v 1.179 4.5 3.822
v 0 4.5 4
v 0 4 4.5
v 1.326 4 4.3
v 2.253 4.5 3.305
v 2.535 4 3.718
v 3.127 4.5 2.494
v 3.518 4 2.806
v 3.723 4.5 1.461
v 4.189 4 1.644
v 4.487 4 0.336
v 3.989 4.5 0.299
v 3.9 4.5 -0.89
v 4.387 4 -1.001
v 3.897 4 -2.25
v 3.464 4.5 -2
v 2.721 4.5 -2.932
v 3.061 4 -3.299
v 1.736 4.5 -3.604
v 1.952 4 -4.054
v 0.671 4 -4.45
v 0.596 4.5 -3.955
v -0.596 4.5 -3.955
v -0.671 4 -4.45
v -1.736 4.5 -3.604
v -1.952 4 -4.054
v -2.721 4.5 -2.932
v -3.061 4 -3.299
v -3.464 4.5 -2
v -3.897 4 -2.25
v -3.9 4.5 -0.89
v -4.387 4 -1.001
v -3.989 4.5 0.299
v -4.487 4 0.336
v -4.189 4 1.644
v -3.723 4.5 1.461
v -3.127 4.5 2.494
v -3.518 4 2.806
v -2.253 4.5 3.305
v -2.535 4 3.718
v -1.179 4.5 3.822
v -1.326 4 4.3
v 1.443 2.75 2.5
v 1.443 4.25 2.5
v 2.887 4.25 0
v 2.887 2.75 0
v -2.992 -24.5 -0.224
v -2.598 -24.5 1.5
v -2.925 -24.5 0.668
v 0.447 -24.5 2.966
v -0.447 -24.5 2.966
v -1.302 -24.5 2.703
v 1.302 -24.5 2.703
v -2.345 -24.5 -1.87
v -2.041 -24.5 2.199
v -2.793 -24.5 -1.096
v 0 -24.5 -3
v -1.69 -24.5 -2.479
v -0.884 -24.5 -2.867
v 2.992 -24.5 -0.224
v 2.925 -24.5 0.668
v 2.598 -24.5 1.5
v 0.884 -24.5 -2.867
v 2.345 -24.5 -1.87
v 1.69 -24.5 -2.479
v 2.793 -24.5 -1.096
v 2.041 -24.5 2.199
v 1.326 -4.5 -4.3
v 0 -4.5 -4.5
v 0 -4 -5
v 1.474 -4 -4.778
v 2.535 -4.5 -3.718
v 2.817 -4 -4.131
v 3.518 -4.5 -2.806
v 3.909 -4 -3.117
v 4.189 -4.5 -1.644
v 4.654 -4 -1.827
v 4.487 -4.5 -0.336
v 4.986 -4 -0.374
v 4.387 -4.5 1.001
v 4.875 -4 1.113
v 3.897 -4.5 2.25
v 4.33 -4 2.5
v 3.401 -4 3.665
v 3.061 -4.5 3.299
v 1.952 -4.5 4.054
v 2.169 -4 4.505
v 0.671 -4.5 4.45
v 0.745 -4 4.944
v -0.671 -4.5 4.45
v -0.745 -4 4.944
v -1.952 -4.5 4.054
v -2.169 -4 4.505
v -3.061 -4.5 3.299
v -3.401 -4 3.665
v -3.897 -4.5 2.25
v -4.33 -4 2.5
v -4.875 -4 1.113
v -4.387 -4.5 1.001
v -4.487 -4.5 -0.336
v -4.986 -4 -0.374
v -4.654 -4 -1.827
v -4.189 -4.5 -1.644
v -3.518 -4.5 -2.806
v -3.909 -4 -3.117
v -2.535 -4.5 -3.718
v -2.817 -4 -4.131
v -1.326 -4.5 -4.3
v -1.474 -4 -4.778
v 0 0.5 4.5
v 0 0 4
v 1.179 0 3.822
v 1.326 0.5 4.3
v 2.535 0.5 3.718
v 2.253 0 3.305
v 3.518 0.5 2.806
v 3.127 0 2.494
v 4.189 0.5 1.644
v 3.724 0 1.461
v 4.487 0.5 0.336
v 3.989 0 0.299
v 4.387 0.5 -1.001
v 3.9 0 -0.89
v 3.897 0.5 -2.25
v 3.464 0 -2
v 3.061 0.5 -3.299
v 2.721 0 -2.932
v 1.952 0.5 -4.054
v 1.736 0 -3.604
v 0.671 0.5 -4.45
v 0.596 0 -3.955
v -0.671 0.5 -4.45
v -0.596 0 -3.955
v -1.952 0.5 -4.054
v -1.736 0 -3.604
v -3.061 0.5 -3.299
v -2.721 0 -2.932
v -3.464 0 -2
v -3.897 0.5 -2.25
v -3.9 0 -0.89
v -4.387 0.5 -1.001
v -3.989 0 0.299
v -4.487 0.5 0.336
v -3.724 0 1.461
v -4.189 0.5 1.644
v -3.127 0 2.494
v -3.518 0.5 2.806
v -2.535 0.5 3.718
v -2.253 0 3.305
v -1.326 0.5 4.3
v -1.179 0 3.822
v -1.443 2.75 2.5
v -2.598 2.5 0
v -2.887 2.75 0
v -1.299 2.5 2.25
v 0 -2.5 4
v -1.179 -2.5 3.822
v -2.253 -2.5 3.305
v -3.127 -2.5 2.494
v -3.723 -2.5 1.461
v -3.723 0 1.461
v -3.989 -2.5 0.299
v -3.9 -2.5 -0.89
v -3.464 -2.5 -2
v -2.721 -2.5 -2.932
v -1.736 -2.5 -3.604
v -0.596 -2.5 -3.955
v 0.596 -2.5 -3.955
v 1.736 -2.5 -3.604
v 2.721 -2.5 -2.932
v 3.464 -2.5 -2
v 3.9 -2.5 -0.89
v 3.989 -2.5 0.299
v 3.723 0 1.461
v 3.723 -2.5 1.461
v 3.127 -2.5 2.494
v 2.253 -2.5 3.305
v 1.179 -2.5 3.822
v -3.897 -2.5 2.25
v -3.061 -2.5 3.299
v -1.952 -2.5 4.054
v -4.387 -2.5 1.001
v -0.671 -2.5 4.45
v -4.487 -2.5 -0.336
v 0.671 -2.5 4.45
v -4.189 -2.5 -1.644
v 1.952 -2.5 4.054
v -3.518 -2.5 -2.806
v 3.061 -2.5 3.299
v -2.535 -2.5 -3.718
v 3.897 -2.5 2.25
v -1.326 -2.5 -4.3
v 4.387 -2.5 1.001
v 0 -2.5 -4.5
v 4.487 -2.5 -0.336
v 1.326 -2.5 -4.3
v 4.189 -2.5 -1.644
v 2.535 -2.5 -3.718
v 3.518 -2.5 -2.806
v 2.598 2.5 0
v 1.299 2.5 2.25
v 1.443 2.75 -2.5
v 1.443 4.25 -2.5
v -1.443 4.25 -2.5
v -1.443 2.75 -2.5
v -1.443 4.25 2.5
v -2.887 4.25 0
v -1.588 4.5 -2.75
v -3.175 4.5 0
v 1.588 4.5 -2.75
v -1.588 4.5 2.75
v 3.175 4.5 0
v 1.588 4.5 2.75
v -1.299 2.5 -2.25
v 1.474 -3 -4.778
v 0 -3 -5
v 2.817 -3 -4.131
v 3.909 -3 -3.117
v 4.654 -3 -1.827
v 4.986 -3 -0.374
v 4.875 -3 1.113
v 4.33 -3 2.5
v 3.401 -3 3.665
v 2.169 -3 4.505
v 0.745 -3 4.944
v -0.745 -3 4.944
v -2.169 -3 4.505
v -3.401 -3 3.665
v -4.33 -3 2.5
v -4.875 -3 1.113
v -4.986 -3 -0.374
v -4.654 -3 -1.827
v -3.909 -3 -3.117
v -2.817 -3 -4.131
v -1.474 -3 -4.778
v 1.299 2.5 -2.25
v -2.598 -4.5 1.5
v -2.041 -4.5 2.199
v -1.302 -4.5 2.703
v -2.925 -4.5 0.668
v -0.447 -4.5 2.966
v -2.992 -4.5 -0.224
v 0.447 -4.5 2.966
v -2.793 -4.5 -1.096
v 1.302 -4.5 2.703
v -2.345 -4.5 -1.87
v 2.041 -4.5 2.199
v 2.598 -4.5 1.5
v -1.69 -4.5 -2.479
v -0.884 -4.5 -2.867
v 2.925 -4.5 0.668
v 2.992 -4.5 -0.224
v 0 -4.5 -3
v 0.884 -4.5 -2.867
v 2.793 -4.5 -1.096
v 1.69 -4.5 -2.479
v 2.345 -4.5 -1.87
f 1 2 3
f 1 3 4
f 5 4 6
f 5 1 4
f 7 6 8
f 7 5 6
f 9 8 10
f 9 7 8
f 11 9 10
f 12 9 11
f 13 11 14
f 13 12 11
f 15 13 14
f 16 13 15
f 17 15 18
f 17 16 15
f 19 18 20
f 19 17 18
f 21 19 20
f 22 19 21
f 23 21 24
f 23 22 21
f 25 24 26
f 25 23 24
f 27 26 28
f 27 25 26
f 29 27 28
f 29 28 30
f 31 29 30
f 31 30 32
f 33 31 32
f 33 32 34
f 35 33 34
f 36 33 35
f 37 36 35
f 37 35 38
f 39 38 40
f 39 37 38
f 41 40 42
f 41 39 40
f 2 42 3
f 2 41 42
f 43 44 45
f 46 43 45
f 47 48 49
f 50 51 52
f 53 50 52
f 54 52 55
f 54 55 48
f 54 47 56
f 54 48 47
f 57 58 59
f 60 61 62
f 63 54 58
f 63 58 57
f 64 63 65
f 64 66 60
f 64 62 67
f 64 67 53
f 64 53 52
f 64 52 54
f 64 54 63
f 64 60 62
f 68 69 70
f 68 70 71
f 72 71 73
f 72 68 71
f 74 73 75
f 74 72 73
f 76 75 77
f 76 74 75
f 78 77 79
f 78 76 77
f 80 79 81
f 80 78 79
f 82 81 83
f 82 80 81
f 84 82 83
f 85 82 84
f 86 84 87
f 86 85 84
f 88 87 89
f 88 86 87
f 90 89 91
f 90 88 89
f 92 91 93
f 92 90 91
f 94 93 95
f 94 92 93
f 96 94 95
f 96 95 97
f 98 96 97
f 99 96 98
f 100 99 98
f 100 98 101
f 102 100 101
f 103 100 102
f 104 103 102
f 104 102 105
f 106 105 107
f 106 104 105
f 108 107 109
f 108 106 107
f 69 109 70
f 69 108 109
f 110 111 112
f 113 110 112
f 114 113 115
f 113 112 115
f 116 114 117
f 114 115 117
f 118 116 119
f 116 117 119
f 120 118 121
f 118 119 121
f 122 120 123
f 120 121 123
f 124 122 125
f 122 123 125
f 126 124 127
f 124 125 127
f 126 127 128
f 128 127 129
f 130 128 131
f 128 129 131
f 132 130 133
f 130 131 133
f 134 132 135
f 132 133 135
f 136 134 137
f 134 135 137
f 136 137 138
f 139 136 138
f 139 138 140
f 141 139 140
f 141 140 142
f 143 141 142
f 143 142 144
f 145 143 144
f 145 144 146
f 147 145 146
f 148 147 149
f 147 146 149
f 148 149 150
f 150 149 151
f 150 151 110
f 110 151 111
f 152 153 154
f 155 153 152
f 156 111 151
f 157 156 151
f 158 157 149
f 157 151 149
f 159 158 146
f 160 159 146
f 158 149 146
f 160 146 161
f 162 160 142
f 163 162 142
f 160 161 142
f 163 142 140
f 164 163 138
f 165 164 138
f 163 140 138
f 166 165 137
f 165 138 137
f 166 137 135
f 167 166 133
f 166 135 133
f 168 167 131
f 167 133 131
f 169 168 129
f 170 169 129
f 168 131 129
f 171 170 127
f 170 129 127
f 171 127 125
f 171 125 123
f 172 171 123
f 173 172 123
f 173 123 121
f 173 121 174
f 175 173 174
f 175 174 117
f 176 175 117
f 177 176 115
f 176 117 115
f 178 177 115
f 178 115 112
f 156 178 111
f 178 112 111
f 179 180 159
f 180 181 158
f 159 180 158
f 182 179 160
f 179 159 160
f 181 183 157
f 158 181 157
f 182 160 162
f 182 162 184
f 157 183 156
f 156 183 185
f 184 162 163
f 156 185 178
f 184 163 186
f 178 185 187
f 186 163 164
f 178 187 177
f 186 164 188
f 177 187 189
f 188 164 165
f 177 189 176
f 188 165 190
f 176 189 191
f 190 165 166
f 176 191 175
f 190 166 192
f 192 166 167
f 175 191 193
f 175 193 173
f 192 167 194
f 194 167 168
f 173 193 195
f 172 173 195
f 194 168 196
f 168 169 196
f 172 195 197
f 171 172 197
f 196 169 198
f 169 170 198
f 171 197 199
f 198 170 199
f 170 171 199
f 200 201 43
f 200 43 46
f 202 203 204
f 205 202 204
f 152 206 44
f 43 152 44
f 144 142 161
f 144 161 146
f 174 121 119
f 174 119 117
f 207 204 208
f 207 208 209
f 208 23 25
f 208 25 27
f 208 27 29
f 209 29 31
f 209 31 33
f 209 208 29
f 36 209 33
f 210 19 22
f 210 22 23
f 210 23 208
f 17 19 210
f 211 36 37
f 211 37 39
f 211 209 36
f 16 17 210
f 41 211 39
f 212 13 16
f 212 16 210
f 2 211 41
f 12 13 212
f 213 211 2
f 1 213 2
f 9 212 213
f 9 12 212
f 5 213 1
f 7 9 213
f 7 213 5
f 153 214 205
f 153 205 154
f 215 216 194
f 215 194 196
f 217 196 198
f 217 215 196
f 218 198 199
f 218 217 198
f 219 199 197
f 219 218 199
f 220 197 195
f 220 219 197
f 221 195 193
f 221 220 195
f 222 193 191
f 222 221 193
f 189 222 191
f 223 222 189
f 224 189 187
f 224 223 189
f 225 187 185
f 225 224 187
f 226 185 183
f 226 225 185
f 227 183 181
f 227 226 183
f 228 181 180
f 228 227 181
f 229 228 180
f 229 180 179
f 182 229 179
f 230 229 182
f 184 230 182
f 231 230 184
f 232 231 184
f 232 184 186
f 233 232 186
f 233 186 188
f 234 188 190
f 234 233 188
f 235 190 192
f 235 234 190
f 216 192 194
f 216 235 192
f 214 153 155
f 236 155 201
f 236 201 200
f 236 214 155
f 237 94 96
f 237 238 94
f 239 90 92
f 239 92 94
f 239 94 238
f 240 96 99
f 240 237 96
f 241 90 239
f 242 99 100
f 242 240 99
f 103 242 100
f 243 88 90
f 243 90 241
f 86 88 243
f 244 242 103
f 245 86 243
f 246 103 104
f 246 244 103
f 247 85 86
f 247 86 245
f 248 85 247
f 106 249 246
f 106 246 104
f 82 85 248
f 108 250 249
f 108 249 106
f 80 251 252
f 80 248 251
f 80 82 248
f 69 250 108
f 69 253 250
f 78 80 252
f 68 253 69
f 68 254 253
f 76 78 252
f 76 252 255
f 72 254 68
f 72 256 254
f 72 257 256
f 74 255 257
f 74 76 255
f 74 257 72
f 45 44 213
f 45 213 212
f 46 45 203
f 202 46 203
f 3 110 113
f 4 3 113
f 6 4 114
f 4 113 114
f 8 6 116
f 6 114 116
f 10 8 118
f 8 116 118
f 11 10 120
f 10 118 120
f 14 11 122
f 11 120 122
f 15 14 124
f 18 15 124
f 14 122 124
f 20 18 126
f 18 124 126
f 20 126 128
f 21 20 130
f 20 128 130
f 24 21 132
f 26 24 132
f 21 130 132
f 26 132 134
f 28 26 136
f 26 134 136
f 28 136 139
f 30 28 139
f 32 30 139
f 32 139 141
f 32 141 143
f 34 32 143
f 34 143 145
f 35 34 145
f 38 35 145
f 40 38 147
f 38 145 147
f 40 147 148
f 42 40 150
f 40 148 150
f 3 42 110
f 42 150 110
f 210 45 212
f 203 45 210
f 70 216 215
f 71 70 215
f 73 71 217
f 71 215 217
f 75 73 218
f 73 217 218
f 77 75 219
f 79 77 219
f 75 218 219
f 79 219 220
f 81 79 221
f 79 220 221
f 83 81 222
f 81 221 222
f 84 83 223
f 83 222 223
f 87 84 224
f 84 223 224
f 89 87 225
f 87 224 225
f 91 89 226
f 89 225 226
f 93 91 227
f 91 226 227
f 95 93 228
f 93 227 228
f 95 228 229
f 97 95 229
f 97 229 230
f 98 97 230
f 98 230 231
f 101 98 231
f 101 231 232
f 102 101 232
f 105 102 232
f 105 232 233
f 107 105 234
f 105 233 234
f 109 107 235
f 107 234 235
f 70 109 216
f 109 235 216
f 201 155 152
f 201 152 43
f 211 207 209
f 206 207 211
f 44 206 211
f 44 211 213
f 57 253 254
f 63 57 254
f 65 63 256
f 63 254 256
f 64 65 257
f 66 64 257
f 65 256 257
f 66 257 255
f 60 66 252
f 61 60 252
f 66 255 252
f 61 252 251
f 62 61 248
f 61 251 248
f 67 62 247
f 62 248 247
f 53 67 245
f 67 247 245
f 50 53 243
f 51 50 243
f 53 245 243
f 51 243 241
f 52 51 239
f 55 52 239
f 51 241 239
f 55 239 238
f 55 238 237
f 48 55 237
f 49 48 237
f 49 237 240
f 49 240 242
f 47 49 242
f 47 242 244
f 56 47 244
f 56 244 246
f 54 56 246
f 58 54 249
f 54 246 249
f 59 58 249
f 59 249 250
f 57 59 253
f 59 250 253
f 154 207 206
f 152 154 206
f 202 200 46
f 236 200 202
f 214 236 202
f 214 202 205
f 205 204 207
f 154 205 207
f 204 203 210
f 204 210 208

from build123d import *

# Parameters (mm, degrees)
SKETCH_1_R          = 4.5
EXTRUDE_1_DEPTH     = 4.5
CUT_EXTRUDE_1_DEPTH = 2
SKETCH_3_R          = 4
EXTRUDE_2_DEPTH     = 2.5
SKETCH_4_R          = 5
EXTRUDE_3_DEPTH     = 2
SKETCH_5_R          = 3
EXTRUDE_4_DEPTH     = 20
CHAMFER_1_SIZE      = 0.5
CHAMFER_2_SIZE      = 0.5
CHAMFER_3_SIZE      = 0.5
CHAMFER_4_SIZE      = 0.25


with BuildPart() as part:
    # ｽｹｯﾁ1 → ﾎﾞｽ - 押し出し1 (new body)
    with BuildSketch(Plane(origin=(0, 0, 0), x_dir=(1, 0, 0), z_dir=(0, 1, 0))):
        with Locations(Location((0, 0, 0), (0, 0, 270))):
            Circle(SKETCH_1_R)
    extrude(amount=EXTRUDE_1_DEPTH)

    # ｽｹｯﾁ2 → ｶｯﾄ - 押し出し1 (cut)
    with BuildSketch(Plane(origin=(0, 4.5, 0), x_dir=(1, 0, 0), z_dir=(0, 1, 0))):
        Polygon((2.886751346, 0), (1.443375673, 2.5), (-1.443375673, 2.5), (-2.886751346, 0), (-1.443375673, -2.5), (1.443375673, -2.5), align=None)
    extrude(amount=-CUT_EXTRUDE_1_DEPTH, mode=Mode.SUBTRACT)

    # ｽｹｯﾁ3 → ﾎﾞｽ - 押し出し2 (add)
    with BuildSketch(Plane.XZ):
        with Locations(Location((0, 0, 0), (0, 0, 90))):
            Circle(SKETCH_3_R)
    extrude(amount=EXTRUDE_2_DEPTH)

    # ｽｹｯﾁ4 → ﾎﾞｽ - 押し出し3 (add)
    with BuildSketch(Plane.XZ.offset(2.5)):
        with Locations(Location((0, 0, 0), (0, 0, 270))):
            Circle(SKETCH_4_R)
    extrude(amount=EXTRUDE_3_DEPTH)

    # ｽｹｯﾁ5 → ﾎﾞｽ - 押し出し4 (add)
    with BuildSketch(Plane.XZ.offset(4.5)):
        with Locations(Location((0, 0, 0), (0, 0, 270))):
            Circle(SKETCH_5_R)
    extrude(amount=EXTRUDE_4_DEPTH)

    # 面取り1
    chamfer_1_edges = [part.edges().sort_by_distance(p)[0] for p in [
        (0, 4.5, -4.5),
    ]]
    chamfer(chamfer_1_edges, length=CHAMFER_1_SIZE)

    # 面取り2
    chamfer_2_edges = [part.edges().sort_by_distance(p)[0] for p in [
        (0, 0, -4.5),
    ]]
    chamfer(chamfer_2_edges, length=CHAMFER_2_SIZE - 0.0001)  # a hair under: the kernel refuses the full size

    # 面取り3
    chamfer_3_edges = [part.edges().sort_by_distance(p)[0] for p in [
        (0, -2.5, 5),
        (0, -4.5, 5),
    ]]
    chamfer(chamfer_3_edges, length=CHAMFER_3_SIZE)

    # 面取り4
    chamfer_4_edges = [part.edges().sort_by_distance(p)[0] for p in [
        (2.165063509, 2.5, -1.25),
        (2.165063509, 4.5, 1.25),
        (2.165063509, 4.5, -1.25),
        (0, 4.5, -2.5),
        (-2.165063509, 4.5, -1.25),
        (-2.165063509, 4.5, 1.25),
        (0, 4.5, 2.5),
        (2.165063509, 2.5, 1.25),
        (0, 2.5, 2.5),
        (-2.165063509, 2.5, 1.25),
        (-2.165063509, 2.5, -1.25),
        (0, 2.5, -2.5),
    ]]
    chamfer(chamfer_4_edges, length=CHAMFER_4_SIZE)


solid = part.part
